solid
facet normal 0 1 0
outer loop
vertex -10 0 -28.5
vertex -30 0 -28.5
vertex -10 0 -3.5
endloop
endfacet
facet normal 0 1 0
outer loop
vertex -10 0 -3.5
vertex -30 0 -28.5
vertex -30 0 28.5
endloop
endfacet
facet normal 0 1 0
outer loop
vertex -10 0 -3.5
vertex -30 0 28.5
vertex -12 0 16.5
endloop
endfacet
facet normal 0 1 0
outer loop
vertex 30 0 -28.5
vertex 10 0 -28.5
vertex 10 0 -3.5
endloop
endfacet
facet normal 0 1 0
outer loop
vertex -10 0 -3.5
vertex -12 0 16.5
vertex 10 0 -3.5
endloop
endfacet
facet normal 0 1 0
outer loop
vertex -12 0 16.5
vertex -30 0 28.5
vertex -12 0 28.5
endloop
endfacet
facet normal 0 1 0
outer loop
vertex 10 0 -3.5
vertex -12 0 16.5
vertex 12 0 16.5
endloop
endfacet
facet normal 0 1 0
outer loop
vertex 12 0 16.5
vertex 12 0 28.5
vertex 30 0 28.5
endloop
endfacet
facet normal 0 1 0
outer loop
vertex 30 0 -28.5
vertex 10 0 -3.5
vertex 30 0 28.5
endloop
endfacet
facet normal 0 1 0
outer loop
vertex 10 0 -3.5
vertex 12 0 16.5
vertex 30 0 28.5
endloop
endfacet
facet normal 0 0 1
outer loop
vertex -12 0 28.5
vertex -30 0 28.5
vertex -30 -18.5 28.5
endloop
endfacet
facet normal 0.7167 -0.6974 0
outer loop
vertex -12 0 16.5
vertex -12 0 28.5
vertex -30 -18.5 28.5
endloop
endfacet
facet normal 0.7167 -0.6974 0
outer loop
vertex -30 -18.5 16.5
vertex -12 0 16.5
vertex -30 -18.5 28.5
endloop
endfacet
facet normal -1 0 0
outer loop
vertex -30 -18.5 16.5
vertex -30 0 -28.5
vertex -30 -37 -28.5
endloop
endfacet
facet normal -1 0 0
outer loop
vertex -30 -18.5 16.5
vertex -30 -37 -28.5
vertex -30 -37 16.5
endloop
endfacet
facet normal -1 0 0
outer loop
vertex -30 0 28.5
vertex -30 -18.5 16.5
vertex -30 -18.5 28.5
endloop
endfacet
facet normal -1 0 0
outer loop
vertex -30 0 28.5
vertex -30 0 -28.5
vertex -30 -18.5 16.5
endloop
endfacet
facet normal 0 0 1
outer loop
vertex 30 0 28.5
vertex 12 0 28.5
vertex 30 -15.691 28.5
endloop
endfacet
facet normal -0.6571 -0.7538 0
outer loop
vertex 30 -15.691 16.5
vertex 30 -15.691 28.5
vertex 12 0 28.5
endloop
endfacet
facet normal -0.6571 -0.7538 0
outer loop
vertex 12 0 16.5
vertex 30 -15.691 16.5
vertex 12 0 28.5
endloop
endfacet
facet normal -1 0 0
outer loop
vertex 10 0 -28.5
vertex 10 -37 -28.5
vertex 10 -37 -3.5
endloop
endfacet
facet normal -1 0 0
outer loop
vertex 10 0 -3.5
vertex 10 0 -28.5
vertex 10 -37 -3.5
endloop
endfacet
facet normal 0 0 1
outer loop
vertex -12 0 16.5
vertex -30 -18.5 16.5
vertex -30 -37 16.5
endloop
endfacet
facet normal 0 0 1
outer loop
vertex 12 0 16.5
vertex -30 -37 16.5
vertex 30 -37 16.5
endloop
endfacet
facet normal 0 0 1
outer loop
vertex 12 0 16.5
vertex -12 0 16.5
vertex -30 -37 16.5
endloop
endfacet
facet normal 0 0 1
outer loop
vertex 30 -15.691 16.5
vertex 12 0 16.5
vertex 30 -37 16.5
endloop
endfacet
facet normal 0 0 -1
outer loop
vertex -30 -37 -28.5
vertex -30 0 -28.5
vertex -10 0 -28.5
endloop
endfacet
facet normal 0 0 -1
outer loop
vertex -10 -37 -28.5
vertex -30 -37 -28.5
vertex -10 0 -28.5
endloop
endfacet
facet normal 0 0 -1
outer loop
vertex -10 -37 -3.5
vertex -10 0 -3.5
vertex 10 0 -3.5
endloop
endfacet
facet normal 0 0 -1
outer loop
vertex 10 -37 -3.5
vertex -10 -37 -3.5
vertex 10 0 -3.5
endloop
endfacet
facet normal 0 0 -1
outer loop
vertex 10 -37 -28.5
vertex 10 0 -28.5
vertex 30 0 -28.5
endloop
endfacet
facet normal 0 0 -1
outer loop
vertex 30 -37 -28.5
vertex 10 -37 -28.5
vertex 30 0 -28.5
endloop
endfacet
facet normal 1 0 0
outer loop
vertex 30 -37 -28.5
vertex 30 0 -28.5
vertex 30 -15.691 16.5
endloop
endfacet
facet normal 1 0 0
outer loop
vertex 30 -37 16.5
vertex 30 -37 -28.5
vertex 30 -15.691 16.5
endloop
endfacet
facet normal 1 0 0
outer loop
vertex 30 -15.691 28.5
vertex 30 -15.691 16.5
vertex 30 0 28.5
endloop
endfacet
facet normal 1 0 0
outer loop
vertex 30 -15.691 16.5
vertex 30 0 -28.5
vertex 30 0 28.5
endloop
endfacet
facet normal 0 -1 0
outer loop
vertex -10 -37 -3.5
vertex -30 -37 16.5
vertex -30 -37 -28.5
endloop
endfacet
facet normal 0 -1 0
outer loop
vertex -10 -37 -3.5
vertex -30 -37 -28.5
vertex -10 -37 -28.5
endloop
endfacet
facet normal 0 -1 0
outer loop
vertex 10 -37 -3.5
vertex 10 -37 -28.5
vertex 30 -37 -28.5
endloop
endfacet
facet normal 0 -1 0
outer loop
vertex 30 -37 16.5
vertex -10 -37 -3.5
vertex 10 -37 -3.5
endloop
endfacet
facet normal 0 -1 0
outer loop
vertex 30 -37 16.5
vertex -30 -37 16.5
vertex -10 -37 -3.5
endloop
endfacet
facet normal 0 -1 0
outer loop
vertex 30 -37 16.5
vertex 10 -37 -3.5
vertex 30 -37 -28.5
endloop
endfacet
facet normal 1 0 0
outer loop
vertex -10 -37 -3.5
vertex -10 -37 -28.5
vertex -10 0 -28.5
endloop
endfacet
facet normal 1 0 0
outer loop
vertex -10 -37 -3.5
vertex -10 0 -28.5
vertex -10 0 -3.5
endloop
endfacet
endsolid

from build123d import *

# Parameters (mm, degrees)
F0_W     = 60
F0_H     = 57
F1_DEPTH = 37
F3_DEPTH = 12
F4_W     = 20
F4_H     = 50
F5_DEPTH = 37.001


with BuildPart() as f1:
    # F0 (on Front) → F1 (new body)
    with BuildSketch(Plane.XZ):
        Rectangle(F0_W, F0_H)
    extrude(amount=F1_DEPTH)

    # F2 (on face) → F3 (cut)
    with BuildSketch(Plane.XY.offset(28.5)):
        Polygon((12, 0), (-12, 0), (-30, -18.5), (-30, -37), (30, -37), (30, -15.690912), align=None)
    extrude(amount=-F3_DEPTH, mode=Mode.SUBTRACT)

    # F4 (on face) → F5 (cut, through all)
    with BuildSketch(Plane.XZ.offset(37)):
        with Locations((0, -28.5)):
            Rectangle(F4_W, F4_H)
    extrude(amount=-F5_DEPTH, mode=Mode.SUBTRACT)


solid = f1.part
